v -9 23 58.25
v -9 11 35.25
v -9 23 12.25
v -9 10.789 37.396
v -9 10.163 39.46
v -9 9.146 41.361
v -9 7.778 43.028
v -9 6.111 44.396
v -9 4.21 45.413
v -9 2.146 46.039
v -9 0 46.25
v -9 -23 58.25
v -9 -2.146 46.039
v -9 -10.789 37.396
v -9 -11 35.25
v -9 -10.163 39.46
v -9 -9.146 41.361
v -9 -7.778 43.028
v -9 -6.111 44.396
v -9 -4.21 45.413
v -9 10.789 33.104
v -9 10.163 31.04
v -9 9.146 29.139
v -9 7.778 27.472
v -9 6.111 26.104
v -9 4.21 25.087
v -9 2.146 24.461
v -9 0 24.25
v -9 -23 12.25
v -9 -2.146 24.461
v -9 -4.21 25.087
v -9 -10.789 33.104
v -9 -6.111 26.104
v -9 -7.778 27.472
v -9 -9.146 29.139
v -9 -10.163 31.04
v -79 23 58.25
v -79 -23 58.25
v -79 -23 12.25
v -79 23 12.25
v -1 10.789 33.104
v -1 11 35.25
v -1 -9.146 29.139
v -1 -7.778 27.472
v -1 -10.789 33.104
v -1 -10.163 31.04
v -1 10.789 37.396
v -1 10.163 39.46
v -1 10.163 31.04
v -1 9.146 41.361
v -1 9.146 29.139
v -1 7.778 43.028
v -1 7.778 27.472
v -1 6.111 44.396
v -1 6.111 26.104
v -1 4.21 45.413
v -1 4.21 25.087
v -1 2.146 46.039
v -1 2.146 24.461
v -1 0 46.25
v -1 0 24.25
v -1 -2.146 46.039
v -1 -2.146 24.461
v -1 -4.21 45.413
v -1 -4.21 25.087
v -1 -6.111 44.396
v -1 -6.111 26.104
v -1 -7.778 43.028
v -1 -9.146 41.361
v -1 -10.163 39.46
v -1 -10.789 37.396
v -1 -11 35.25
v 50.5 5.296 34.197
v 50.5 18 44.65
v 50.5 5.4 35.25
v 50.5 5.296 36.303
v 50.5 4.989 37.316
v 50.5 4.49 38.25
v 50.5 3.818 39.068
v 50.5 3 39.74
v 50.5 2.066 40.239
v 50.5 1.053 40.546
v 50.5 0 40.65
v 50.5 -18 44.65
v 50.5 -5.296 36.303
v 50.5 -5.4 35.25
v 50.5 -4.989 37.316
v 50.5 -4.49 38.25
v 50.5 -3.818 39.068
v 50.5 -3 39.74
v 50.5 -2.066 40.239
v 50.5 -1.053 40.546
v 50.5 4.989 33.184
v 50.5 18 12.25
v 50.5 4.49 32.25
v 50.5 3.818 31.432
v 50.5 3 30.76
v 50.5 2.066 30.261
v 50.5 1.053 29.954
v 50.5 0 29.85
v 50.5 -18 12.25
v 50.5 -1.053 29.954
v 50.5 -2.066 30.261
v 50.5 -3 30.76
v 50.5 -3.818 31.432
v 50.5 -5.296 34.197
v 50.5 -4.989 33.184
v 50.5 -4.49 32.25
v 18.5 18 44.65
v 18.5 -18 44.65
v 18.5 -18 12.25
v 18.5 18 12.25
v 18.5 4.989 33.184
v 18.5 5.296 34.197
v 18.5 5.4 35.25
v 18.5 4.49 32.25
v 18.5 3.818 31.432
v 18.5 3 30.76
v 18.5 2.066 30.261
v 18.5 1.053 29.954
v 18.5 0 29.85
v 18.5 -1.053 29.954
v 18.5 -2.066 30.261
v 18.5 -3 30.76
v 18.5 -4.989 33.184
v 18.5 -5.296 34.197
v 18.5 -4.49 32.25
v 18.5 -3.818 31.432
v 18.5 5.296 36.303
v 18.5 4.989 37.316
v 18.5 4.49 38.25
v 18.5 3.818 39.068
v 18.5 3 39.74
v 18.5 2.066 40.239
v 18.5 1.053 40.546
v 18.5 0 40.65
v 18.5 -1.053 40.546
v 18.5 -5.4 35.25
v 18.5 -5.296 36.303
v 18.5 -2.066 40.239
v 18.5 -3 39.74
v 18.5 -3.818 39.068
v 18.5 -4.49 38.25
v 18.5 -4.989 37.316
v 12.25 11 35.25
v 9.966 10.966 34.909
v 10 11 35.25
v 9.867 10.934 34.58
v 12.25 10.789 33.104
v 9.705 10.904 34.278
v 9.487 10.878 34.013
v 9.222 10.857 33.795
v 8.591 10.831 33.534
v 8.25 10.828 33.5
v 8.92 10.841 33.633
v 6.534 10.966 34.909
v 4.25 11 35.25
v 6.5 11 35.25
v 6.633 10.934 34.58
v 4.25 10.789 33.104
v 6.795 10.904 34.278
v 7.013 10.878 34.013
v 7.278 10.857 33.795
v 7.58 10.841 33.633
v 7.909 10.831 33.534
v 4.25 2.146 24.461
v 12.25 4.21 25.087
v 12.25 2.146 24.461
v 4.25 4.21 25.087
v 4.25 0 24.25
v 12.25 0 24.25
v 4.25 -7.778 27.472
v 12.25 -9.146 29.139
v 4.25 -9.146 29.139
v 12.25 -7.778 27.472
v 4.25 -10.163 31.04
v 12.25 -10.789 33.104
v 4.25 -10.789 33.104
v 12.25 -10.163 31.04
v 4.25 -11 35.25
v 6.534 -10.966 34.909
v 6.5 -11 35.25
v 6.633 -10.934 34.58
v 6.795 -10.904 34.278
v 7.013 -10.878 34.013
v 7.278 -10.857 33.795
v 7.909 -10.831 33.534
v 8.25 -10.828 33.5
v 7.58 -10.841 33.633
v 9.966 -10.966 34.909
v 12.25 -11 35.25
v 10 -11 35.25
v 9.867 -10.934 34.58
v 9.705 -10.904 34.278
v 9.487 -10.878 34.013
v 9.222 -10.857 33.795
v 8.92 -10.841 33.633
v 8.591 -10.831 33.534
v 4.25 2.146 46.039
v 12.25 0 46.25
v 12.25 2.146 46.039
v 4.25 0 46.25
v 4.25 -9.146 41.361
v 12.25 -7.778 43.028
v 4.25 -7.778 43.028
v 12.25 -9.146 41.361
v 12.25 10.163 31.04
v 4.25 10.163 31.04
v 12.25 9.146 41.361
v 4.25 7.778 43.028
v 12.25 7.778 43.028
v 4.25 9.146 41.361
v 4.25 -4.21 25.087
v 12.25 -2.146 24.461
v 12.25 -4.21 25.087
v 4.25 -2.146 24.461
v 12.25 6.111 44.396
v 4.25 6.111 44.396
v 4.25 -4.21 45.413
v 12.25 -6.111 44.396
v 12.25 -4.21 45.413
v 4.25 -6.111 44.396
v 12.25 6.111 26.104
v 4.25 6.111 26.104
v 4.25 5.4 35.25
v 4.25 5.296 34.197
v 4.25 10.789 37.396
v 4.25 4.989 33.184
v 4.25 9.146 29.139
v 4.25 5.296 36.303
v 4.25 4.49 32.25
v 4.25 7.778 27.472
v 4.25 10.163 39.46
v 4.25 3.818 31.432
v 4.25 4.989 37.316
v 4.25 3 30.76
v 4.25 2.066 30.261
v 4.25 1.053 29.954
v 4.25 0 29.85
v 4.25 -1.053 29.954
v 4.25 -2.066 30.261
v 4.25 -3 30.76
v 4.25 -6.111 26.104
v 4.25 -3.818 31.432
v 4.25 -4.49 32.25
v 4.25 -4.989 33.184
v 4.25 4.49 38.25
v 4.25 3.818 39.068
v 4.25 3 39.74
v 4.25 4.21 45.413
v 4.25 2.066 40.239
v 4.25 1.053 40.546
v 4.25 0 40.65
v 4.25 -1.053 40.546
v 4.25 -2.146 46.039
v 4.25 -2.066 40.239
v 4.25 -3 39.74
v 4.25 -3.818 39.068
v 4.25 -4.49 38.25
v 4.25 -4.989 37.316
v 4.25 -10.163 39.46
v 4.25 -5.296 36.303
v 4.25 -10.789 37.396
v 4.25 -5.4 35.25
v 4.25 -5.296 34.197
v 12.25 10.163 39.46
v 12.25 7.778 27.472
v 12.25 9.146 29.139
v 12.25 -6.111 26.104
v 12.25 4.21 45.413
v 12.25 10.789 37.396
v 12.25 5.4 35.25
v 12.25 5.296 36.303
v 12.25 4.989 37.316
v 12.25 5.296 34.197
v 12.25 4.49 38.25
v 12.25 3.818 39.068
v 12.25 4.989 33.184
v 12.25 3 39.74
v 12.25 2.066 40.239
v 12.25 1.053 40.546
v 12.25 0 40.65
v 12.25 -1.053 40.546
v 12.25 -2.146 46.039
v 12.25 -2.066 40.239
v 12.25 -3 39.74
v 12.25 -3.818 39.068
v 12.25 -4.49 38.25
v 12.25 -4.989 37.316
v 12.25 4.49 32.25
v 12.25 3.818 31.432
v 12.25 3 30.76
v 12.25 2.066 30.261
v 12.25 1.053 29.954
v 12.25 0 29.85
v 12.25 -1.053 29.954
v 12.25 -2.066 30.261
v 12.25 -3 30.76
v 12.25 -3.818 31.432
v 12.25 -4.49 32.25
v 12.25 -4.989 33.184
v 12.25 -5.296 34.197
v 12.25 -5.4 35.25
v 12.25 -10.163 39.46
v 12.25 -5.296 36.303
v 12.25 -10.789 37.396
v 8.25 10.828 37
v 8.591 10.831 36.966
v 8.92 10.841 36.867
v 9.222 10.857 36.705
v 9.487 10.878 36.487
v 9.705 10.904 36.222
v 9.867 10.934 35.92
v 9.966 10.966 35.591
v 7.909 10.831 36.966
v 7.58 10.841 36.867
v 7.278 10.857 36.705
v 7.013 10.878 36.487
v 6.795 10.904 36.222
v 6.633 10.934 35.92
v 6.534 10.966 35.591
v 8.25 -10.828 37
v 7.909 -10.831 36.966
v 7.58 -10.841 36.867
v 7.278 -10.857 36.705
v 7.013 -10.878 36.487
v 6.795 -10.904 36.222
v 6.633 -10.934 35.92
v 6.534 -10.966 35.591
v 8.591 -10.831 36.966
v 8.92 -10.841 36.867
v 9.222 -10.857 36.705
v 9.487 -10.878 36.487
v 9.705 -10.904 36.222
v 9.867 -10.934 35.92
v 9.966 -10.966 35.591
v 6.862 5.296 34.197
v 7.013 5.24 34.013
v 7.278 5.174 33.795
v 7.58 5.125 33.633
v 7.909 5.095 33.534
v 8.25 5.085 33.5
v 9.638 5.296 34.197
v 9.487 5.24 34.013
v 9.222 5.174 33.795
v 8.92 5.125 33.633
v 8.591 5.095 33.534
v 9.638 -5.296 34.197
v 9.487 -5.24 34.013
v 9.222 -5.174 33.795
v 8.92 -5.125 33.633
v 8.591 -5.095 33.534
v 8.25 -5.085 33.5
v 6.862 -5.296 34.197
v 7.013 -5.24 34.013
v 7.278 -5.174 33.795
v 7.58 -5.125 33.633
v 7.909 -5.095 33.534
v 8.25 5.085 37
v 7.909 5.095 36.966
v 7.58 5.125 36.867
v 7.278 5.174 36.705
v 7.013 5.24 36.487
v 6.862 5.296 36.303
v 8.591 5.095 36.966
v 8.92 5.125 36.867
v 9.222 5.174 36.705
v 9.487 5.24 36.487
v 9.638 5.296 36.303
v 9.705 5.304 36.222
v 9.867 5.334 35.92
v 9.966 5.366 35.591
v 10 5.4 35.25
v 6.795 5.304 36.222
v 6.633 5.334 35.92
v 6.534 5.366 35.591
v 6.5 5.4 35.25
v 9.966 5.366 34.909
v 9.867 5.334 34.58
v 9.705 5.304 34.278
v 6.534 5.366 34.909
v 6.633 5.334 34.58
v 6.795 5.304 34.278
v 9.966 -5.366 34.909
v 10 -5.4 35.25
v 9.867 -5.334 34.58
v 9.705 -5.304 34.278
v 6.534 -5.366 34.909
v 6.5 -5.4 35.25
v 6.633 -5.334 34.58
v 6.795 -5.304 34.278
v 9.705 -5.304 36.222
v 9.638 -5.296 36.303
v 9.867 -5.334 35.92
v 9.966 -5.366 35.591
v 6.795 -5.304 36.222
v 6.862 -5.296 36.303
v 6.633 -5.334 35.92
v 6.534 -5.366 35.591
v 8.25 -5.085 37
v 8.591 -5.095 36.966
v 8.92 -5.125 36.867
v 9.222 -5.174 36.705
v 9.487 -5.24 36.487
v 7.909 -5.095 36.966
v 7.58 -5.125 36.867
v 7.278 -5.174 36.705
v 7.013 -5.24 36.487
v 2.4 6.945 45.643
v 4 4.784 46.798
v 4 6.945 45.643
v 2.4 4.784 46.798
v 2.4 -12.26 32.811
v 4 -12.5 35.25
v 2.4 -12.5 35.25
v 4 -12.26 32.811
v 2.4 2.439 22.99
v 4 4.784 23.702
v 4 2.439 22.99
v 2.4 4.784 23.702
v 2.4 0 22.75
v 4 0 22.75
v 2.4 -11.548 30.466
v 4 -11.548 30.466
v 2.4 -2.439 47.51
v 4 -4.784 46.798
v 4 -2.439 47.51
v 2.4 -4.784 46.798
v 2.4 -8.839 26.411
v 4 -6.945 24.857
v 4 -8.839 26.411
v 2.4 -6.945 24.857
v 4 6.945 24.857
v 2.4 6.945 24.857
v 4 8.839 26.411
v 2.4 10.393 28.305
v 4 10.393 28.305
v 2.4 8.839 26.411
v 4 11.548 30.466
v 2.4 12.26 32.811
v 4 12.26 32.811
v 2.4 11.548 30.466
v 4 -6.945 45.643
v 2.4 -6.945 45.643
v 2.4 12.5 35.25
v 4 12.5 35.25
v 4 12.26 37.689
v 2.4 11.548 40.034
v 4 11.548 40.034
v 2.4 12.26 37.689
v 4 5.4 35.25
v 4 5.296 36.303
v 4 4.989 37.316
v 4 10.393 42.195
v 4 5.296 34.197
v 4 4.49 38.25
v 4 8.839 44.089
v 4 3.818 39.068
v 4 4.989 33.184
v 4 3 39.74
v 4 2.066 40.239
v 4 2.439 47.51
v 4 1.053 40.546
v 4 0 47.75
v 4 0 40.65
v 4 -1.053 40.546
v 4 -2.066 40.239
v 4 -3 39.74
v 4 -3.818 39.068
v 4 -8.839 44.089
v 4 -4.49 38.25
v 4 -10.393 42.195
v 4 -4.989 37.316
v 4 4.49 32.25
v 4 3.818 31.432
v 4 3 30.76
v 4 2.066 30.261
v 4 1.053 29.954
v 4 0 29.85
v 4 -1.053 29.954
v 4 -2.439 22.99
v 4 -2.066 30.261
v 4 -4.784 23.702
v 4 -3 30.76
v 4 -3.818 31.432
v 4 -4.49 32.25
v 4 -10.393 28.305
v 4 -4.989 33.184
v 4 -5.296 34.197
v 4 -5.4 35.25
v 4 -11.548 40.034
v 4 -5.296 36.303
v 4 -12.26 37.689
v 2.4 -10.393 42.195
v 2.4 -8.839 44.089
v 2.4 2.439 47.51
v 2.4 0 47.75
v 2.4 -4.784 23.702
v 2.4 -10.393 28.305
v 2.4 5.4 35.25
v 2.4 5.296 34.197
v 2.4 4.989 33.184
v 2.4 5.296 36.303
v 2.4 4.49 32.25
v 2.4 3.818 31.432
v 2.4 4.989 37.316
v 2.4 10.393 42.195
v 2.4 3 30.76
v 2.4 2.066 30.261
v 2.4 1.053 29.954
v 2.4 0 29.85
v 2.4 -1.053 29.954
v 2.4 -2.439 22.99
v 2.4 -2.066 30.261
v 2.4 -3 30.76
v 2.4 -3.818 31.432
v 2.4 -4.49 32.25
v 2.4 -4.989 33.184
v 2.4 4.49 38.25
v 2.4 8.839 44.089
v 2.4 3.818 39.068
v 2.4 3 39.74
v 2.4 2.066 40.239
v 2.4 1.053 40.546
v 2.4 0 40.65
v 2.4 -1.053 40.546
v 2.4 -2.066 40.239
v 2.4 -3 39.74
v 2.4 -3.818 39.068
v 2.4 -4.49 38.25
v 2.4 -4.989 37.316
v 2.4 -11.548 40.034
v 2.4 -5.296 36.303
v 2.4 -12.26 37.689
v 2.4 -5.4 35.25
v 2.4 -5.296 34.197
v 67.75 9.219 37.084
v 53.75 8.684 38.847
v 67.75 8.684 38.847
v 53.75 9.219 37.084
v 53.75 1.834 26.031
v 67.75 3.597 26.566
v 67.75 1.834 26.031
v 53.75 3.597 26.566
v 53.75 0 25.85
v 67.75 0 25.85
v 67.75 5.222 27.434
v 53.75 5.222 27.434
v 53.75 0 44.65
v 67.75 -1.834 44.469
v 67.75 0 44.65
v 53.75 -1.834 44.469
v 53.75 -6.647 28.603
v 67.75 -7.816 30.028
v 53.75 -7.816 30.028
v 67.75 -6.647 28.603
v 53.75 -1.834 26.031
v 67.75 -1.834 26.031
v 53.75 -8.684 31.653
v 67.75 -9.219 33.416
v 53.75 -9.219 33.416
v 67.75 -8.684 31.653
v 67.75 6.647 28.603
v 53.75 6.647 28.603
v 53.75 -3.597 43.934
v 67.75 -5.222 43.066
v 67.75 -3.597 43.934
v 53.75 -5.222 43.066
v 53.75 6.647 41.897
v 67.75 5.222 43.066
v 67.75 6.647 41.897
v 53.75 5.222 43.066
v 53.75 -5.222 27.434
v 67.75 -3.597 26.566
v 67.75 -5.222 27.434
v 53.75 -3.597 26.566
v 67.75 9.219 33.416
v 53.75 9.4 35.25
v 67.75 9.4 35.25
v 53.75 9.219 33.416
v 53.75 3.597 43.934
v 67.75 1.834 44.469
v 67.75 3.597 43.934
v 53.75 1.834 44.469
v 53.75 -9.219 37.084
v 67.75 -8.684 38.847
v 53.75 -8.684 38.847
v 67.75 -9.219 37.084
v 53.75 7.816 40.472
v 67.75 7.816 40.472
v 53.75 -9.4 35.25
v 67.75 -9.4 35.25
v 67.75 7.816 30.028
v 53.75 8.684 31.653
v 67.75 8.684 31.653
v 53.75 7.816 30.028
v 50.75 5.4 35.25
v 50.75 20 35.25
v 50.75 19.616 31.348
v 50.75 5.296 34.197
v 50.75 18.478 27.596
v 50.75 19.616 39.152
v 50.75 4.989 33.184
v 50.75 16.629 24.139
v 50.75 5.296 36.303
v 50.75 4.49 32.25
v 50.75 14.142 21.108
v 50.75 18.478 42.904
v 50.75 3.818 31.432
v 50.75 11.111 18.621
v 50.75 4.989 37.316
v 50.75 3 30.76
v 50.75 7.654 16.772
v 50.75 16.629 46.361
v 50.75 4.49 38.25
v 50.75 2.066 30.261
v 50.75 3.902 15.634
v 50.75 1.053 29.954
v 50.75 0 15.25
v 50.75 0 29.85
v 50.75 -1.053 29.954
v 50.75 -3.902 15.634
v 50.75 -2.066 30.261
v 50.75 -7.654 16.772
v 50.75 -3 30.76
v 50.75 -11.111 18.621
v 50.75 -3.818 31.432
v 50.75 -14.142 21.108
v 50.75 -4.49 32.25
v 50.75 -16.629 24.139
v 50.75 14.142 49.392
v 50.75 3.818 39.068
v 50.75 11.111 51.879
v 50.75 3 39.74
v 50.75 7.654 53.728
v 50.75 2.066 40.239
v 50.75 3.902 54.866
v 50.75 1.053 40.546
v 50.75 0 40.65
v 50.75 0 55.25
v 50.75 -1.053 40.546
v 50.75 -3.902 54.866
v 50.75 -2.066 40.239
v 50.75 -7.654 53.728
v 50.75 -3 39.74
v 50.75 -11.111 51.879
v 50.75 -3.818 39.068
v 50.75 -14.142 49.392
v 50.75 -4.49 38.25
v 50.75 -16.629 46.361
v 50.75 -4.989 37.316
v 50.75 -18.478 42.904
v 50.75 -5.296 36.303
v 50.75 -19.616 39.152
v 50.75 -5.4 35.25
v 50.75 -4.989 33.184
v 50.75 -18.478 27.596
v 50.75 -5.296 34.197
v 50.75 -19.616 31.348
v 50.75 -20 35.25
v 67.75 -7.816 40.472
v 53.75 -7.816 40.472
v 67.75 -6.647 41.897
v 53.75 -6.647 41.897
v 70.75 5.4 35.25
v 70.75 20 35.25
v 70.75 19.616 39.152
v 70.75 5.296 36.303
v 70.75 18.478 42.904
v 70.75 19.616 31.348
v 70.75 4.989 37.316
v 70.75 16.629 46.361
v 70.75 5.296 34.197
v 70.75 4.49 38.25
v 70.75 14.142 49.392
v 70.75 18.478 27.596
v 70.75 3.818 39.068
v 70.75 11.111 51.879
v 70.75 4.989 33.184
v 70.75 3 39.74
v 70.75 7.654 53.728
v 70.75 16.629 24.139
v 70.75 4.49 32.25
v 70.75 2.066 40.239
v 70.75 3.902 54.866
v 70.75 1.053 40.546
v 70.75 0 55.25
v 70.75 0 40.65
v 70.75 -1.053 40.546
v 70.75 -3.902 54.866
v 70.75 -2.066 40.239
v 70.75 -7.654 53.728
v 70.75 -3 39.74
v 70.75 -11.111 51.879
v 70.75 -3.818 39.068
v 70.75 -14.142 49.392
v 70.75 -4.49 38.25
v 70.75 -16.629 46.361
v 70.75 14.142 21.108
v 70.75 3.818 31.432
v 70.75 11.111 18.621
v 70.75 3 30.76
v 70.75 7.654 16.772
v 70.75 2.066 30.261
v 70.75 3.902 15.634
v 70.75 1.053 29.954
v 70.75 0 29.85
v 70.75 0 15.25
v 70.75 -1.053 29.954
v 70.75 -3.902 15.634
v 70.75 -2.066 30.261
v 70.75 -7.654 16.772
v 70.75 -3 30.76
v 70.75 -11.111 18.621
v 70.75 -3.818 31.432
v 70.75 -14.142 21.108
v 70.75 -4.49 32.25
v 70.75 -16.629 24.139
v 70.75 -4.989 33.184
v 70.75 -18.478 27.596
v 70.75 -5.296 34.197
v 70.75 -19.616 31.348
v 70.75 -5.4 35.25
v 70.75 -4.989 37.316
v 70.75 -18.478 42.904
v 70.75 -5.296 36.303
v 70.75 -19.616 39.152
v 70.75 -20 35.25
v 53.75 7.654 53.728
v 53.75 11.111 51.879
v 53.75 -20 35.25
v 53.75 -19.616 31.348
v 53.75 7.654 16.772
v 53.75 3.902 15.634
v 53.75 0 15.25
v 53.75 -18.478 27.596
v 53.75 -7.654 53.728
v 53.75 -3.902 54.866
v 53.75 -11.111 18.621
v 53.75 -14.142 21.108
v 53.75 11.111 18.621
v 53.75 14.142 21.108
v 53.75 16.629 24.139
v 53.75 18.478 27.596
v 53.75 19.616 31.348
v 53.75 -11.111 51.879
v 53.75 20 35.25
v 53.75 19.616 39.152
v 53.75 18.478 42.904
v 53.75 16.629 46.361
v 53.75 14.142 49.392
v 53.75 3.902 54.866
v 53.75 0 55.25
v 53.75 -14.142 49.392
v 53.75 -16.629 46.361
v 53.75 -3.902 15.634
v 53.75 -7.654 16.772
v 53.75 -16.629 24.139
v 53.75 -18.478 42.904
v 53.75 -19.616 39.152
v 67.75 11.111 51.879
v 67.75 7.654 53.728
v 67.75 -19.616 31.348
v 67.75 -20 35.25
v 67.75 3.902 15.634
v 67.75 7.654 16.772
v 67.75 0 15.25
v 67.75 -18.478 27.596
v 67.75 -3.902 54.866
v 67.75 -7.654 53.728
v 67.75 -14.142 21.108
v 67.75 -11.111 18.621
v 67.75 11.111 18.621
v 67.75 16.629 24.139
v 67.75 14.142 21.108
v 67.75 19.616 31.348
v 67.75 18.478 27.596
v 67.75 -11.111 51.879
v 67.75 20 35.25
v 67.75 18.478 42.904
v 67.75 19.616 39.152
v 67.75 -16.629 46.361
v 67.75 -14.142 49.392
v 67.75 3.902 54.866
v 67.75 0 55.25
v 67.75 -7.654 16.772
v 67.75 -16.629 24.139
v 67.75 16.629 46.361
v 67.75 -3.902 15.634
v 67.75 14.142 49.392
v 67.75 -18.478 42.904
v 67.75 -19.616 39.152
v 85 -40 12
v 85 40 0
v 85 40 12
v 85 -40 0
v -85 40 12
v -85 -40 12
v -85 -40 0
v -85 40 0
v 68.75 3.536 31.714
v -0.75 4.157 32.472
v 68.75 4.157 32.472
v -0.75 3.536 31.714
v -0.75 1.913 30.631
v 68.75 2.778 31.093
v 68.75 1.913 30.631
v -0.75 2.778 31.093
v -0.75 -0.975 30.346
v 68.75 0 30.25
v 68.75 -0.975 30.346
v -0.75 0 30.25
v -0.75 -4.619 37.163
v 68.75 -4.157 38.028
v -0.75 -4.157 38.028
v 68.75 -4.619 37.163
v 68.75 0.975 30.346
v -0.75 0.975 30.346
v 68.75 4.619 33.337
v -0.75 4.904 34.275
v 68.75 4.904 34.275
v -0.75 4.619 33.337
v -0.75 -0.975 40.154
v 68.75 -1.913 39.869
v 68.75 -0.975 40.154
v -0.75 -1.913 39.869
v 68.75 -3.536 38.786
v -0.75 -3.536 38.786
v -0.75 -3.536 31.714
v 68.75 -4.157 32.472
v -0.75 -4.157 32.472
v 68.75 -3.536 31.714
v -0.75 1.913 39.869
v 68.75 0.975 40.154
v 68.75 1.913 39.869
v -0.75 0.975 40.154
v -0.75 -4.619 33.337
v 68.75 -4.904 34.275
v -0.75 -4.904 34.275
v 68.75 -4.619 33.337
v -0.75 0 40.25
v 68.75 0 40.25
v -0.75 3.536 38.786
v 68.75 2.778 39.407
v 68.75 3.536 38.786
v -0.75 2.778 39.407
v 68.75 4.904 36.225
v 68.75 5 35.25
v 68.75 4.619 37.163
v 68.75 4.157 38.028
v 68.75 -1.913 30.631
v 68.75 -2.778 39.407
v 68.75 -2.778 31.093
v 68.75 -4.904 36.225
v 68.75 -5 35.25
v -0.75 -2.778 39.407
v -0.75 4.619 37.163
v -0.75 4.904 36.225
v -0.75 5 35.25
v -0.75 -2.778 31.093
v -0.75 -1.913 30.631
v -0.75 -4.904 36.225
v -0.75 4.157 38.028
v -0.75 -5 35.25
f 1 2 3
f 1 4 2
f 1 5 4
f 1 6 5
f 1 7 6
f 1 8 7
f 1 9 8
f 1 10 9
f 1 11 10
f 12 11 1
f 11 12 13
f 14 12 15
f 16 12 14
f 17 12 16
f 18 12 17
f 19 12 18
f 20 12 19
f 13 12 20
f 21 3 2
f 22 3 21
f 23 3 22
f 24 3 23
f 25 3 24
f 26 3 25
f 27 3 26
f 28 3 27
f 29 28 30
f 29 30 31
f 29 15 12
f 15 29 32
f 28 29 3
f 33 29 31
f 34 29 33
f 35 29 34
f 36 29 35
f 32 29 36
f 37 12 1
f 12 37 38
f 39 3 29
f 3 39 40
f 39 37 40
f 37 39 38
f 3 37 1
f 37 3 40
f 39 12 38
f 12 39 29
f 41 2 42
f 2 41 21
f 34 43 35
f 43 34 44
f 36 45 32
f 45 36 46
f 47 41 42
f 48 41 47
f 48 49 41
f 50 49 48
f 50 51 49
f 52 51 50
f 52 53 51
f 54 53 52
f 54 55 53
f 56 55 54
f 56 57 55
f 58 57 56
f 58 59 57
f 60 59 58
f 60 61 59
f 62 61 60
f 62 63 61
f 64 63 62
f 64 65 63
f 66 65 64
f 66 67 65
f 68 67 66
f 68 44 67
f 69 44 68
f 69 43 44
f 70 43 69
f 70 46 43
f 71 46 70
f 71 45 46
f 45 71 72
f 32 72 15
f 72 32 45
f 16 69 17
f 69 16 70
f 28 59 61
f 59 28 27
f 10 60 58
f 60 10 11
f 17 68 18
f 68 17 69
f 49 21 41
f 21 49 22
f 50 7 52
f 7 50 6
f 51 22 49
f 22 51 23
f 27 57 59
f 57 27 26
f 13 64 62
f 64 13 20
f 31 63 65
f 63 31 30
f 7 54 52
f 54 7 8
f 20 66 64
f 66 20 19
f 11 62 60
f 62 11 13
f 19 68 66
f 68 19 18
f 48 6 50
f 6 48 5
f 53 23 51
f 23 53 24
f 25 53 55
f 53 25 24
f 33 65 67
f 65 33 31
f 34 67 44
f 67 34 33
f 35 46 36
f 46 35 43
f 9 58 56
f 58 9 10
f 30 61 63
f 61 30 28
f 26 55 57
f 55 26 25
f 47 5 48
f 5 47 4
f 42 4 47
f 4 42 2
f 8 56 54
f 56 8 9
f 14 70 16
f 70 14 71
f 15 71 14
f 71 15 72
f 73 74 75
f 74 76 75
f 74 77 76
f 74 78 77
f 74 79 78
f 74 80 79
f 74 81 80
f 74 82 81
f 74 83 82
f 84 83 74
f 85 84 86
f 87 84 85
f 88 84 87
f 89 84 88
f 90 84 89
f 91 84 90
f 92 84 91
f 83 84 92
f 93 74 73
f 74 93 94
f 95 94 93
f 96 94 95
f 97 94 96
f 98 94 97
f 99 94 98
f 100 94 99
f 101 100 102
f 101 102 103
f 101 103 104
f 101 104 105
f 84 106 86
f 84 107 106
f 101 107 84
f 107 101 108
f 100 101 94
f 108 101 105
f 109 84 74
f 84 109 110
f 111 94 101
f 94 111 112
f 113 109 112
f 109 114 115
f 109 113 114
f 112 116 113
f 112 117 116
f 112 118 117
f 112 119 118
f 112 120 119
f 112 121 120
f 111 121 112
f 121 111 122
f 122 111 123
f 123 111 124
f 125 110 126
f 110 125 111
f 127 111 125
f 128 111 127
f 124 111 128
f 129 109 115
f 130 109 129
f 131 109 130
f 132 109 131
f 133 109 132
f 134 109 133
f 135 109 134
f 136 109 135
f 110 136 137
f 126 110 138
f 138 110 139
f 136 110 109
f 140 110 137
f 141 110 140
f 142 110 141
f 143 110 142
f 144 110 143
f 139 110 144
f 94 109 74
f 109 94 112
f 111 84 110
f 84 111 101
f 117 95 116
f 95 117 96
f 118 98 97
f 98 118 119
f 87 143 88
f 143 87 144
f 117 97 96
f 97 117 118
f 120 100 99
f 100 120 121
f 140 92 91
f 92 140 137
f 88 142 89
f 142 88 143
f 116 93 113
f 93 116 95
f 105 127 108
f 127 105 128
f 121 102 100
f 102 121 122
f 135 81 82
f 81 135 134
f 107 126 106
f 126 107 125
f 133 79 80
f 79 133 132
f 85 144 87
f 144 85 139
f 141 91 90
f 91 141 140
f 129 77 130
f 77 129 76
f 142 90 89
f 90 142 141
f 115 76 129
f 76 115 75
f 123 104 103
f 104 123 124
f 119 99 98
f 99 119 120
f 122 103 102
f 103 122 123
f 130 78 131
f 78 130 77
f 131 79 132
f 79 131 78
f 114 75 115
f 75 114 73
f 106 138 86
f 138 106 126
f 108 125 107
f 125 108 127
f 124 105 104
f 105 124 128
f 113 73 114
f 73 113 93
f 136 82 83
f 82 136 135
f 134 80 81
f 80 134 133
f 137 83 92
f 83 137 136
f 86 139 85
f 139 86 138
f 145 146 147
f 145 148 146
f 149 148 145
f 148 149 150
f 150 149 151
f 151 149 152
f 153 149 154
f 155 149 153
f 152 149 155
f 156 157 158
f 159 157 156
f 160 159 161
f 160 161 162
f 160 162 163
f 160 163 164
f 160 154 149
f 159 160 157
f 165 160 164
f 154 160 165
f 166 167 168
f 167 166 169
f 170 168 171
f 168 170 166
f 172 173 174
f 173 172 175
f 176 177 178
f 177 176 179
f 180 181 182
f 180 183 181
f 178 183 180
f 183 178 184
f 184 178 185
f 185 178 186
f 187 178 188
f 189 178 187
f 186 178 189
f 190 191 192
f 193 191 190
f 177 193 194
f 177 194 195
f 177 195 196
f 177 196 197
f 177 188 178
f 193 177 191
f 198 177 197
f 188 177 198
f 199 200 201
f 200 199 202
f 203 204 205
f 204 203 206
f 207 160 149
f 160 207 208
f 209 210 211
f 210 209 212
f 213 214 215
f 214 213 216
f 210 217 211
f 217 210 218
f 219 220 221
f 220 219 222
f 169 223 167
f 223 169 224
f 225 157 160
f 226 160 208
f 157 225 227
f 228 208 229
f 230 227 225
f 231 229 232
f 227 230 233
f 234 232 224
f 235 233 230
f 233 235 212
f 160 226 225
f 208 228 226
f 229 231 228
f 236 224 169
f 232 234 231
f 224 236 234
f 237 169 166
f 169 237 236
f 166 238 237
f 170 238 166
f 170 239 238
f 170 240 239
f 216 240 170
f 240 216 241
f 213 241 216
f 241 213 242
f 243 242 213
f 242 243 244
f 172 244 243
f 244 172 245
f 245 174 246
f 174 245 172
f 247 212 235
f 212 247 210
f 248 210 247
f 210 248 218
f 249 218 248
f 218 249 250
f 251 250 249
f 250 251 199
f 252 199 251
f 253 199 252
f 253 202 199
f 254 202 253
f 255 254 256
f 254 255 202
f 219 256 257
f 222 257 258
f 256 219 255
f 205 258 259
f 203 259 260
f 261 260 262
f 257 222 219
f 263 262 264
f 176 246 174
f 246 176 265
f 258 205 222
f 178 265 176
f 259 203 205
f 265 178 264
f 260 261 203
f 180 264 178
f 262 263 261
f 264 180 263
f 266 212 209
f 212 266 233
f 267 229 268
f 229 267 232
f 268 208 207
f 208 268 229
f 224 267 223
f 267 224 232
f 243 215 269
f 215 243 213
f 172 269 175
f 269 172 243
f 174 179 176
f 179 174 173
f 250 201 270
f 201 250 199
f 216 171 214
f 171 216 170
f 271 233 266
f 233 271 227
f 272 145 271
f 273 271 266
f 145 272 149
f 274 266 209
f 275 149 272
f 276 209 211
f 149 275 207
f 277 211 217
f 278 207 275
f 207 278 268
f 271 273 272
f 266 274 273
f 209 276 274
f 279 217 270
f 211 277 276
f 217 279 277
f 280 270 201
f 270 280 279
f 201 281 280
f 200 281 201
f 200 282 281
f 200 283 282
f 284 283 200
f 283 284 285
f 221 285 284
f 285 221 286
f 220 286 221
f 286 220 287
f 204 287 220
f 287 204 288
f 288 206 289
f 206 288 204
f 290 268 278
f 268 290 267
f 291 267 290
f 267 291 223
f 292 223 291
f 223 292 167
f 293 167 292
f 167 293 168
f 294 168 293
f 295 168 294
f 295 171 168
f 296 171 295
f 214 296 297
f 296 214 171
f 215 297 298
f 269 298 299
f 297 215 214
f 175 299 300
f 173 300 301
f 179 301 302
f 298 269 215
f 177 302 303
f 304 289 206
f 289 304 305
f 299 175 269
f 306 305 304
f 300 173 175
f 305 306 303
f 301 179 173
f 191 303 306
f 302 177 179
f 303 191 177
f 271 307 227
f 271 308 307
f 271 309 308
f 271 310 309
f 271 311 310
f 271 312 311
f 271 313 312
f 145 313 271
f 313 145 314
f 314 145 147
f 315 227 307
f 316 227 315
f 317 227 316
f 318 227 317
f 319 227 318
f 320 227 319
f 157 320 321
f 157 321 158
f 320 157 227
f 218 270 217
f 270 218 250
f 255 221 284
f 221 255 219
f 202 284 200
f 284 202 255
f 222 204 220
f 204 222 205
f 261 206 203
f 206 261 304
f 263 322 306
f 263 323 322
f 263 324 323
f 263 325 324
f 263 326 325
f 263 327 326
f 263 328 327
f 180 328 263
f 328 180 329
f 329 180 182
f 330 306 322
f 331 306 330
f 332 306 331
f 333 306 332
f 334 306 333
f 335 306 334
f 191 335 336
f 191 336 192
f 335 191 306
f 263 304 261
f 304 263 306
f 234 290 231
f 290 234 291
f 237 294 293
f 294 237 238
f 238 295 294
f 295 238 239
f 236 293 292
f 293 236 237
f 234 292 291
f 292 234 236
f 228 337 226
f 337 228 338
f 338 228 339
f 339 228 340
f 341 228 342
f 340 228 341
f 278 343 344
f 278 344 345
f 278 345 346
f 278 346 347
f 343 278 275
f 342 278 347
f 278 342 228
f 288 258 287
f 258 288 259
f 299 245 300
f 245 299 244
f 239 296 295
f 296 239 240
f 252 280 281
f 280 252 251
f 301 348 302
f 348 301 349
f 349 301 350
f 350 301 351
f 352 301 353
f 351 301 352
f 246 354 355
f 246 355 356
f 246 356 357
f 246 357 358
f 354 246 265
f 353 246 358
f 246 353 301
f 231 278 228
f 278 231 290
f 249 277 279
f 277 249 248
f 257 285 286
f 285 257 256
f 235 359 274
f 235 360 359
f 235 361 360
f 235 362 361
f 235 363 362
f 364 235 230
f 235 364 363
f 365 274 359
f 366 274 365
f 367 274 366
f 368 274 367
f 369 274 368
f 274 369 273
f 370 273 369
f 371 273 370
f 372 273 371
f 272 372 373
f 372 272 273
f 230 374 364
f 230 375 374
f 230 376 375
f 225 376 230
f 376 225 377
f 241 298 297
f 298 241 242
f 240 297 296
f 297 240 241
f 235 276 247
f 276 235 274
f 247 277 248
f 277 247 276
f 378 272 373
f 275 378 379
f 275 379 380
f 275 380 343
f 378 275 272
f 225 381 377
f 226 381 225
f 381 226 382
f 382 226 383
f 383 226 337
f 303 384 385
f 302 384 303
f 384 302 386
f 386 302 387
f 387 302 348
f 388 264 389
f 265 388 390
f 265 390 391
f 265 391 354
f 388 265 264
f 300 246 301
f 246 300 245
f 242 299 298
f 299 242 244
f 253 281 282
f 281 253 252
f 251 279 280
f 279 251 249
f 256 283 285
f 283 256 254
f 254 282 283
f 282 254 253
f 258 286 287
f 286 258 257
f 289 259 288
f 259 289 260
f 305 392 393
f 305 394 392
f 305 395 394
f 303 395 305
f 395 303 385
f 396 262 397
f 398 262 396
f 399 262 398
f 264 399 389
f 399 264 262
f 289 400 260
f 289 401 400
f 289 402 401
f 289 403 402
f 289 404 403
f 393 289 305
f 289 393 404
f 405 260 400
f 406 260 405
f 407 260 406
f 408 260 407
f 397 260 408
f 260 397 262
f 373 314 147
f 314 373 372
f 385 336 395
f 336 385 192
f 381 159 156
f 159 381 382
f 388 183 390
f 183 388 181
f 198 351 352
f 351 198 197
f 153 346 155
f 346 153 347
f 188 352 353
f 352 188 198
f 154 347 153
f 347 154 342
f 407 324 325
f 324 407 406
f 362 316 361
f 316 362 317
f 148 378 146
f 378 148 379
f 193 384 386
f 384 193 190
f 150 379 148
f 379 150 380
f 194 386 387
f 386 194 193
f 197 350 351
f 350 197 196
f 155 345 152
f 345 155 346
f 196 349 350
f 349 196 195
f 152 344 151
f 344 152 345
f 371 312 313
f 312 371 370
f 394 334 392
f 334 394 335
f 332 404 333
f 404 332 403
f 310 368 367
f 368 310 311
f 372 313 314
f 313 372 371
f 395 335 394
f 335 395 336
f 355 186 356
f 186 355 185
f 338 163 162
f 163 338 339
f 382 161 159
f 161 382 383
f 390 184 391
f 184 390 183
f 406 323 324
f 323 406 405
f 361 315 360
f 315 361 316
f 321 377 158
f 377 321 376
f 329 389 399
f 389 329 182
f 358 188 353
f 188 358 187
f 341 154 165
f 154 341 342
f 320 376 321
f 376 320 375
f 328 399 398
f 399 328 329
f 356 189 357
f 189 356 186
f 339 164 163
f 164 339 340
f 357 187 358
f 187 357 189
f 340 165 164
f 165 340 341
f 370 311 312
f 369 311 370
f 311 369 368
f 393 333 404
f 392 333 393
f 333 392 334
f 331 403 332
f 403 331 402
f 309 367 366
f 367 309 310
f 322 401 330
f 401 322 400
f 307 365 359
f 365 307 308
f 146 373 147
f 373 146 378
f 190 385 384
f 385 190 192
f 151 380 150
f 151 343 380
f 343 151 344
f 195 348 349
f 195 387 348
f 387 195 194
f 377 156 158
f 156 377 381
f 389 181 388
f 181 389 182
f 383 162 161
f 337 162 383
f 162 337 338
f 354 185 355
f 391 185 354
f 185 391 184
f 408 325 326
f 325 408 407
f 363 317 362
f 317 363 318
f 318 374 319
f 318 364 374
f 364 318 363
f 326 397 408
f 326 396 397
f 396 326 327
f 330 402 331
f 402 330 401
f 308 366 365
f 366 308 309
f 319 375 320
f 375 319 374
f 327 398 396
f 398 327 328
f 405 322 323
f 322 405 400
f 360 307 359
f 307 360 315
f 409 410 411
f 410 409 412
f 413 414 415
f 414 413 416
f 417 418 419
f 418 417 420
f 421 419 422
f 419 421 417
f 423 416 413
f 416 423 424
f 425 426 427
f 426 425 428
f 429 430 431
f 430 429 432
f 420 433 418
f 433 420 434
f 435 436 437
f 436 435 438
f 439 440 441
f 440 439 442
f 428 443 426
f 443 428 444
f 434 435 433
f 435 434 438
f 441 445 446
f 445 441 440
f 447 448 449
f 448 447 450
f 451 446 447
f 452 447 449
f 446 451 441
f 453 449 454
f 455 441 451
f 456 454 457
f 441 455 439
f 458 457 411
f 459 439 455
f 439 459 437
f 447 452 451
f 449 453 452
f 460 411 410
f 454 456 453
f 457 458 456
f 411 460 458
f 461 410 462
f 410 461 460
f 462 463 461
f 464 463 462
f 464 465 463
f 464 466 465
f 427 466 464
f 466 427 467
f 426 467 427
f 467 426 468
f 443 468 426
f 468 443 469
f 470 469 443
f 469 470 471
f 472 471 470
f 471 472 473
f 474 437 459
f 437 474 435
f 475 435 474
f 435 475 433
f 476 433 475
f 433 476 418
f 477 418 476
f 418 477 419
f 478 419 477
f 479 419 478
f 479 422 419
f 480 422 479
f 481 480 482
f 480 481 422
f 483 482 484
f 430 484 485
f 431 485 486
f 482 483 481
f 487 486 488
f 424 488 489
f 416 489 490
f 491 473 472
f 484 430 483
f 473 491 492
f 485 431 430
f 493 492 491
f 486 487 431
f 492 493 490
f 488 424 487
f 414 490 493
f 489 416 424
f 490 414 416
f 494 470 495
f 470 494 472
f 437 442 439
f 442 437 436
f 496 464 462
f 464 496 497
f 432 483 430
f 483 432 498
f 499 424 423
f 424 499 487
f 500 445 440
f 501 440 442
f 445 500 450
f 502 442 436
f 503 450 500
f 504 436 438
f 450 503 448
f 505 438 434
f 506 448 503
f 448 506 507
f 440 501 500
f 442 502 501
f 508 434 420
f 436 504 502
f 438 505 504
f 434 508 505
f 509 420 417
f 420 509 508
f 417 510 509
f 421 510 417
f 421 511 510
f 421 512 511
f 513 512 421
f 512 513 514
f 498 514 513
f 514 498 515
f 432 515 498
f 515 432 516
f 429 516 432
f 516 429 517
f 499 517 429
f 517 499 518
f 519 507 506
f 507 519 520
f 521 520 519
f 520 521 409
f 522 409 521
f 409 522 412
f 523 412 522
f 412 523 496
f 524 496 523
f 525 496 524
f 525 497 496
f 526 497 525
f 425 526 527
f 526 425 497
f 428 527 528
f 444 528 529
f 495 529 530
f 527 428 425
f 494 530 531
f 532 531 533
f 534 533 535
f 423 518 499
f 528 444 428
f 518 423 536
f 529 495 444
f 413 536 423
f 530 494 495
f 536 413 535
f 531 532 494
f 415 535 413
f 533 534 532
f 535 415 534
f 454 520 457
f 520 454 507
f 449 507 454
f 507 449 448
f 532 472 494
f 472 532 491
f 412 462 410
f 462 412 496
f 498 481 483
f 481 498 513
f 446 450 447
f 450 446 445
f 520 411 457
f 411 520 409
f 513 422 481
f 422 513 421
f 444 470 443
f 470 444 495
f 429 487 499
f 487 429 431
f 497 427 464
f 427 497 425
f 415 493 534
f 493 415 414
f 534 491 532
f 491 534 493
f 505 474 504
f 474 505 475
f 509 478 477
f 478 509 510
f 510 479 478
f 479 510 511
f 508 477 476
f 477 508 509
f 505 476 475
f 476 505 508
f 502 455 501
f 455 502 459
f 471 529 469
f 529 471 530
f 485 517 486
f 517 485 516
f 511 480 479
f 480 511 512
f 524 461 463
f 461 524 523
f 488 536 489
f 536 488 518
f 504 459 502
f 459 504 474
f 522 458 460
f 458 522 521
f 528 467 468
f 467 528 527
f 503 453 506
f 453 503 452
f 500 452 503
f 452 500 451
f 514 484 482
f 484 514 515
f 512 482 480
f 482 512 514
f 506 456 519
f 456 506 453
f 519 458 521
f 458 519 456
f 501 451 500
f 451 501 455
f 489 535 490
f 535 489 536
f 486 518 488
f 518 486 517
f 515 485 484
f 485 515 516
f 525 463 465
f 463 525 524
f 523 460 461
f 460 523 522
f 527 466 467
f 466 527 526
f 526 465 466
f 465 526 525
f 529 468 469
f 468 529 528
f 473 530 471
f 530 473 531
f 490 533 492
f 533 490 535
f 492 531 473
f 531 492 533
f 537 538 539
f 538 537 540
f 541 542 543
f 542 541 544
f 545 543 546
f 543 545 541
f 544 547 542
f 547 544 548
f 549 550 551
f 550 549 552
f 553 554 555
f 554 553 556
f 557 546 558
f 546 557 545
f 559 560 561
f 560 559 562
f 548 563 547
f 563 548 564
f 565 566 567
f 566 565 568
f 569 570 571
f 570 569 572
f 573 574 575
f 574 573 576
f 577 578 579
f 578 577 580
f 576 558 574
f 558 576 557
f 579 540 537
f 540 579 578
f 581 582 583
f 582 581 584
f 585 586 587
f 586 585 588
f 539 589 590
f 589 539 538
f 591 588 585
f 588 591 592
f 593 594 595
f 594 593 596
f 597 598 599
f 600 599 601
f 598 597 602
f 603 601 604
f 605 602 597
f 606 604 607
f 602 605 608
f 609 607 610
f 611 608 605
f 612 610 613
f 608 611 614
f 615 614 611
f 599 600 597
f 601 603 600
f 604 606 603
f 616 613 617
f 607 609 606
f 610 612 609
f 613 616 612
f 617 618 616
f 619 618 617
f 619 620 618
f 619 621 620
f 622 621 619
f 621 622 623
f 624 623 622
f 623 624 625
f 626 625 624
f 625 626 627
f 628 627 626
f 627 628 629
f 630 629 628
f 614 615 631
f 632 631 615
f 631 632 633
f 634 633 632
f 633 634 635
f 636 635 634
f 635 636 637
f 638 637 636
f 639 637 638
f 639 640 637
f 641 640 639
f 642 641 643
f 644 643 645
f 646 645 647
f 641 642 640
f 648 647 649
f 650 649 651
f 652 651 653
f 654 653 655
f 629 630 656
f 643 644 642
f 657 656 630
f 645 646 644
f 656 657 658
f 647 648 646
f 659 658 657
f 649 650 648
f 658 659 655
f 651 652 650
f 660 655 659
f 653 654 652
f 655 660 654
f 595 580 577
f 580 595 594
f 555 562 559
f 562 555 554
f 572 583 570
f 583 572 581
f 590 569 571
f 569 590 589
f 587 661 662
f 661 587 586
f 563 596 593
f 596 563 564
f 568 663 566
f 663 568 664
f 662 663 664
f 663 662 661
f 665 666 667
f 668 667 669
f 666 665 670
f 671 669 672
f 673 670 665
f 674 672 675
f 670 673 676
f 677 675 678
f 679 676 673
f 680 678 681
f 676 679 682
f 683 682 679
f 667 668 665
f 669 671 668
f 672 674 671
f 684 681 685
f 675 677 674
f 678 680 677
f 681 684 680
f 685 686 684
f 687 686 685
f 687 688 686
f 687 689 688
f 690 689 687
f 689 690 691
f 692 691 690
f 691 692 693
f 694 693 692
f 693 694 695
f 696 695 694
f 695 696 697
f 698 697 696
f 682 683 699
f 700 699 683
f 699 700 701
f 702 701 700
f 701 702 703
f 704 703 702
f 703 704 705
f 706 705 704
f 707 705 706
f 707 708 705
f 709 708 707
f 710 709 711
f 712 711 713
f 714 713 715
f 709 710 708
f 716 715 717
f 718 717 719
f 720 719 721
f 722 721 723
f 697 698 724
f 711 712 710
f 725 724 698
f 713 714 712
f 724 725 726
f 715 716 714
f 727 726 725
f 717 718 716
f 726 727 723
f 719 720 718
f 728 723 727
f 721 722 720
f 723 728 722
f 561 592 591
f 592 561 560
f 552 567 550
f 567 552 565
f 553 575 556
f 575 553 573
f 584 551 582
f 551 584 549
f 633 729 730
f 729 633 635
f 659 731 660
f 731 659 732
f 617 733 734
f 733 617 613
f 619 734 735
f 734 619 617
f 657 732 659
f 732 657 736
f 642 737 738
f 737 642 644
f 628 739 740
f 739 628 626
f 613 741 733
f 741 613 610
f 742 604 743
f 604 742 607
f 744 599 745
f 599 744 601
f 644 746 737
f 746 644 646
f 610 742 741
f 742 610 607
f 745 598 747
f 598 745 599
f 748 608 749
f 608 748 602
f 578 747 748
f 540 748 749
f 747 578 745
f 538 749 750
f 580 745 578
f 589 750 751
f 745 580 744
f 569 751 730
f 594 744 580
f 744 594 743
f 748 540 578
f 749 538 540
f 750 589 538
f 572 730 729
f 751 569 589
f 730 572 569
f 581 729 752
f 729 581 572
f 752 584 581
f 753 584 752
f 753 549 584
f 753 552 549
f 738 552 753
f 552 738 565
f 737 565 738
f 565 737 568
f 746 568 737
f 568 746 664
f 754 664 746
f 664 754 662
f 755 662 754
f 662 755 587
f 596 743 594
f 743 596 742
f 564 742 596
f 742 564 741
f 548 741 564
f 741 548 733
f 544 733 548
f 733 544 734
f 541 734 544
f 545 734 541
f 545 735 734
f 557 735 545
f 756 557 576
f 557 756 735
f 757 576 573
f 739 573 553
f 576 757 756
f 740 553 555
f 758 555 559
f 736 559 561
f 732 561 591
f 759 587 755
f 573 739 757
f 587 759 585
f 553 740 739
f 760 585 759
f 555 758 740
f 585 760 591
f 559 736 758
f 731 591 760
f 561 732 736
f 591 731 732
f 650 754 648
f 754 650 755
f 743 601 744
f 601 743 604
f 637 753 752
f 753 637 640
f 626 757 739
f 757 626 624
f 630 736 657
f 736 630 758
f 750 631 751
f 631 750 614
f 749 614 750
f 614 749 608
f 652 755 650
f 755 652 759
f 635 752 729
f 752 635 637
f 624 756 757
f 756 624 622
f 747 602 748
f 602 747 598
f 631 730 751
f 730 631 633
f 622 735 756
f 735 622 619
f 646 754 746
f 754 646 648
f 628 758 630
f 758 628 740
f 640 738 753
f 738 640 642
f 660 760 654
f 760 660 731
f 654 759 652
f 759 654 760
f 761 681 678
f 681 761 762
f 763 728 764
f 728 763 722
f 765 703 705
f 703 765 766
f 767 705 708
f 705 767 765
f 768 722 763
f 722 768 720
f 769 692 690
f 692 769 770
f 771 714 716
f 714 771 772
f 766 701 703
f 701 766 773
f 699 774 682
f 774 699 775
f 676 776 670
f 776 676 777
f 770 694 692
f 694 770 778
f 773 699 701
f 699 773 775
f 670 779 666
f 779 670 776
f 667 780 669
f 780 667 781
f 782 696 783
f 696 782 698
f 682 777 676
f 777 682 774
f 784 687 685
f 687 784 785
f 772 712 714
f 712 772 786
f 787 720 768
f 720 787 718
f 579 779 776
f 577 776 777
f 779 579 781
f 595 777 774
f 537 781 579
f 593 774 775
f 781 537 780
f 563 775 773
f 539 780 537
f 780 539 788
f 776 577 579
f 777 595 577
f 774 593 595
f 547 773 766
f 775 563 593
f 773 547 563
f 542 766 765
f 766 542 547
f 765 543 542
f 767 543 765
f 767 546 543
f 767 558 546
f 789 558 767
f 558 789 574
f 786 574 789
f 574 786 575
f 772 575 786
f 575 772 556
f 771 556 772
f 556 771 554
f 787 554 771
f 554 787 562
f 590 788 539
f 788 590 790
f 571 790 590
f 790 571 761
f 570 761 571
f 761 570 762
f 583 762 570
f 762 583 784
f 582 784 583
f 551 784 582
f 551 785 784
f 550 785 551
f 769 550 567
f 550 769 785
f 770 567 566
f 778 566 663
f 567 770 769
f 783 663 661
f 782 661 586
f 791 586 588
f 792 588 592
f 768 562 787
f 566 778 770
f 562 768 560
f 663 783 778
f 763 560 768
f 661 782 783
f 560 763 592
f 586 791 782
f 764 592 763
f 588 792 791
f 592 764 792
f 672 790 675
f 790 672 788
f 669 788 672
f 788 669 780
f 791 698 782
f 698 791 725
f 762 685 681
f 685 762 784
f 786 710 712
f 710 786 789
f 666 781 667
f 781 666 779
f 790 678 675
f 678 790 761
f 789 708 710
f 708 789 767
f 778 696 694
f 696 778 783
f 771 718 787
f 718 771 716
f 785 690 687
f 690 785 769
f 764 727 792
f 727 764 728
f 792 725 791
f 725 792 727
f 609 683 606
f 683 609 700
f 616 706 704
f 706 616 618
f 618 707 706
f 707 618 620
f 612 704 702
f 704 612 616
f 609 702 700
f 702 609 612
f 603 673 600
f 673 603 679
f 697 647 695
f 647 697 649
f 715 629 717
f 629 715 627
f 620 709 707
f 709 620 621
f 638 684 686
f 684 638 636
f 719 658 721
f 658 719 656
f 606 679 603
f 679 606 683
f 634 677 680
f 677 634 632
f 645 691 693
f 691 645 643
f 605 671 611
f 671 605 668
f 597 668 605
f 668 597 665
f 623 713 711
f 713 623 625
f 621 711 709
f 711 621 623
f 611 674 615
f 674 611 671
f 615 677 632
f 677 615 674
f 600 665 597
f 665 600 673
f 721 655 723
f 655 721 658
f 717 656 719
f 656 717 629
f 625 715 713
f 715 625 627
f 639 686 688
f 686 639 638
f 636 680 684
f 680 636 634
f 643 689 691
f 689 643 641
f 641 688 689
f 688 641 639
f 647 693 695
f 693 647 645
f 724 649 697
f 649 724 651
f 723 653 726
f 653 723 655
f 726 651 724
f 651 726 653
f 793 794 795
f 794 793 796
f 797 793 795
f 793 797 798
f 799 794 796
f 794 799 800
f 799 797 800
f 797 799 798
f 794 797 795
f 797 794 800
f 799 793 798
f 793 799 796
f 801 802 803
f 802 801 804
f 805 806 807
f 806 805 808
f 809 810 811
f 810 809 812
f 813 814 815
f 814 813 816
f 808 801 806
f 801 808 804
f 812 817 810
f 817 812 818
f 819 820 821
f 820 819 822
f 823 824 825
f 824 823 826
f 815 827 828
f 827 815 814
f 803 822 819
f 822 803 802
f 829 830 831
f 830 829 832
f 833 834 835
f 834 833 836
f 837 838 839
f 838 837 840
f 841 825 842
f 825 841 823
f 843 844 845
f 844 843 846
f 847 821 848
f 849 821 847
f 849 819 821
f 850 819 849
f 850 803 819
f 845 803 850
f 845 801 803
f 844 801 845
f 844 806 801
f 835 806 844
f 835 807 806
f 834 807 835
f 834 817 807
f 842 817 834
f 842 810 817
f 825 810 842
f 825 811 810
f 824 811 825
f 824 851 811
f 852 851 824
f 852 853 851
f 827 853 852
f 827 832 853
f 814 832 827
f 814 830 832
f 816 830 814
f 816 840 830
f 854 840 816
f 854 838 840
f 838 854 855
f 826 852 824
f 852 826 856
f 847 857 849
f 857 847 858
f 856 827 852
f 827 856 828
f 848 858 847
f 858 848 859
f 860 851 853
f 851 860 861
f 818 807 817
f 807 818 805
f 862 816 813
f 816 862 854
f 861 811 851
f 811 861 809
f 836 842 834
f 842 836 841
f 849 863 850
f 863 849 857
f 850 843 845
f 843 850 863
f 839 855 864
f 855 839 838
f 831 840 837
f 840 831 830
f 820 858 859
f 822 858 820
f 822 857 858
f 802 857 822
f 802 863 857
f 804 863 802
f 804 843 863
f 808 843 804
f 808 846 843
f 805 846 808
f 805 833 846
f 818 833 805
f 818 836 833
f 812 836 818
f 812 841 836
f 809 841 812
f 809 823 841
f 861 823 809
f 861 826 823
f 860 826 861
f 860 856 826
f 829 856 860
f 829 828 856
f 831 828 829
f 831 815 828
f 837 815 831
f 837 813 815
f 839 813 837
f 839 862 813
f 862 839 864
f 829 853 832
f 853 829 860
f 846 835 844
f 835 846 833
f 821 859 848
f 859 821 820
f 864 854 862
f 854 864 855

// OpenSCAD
$fn = 32;

// ------------------------------------------------------------------------
// Motor drive station: motor 70 x 46 mm, shaft d10, pulley d40
// Every part is its own module, assembly() places every instance.
// ------------------------------------------------------------------------

// --- part 1 ---
module station_bed() {
  difference() {
    translate([-85, -40, 0]) cube([170, 80, 12]);
  }
}

// --- part 2 ---
module drive_motor() {
  union() {
    translate([-35, -23, 0]) cube([70, 46, 46]);
    translate([39, 0, 23]) rotate([0, 90, 0]) cylinder(h = 8, d = 22, center = true);
  }
}

// --- part 3 ---
module pillow_block() {
  difference() {
    translate([-16, -18, 0]) cube([32, 36, 32.4]);
    translate([0, 0, 23]) rotate([0, 90, 0]) cylinder(h = 34, d = 10.8, center = true);
  }
}

// --- part 4 ---
module drive_shaft() {
  translate([0, 0, -34.75]) cylinder(h = 69.5, d = 10);
}

// --- part 5 ---
module shaft_collar() {
  difference() {
    cylinder(h = 8, d = 22);
    translate([0, 0, -1]) cylinder(h = 10, d = 10.8);
    translate([0, 0, 4]) rotate([90, 0, 0]) cylinder(h = 24, d = 3.5, center = true);
  }
}

// --- part 6 ---
module collar_washer() {
  difference() {
      translate([0, 0, 0]) cylinder(h = 1.6, d = 25);
      translate([0, 0, -1]) cylinder(h = 3.6, d = 10.8);
    }
}

// --- part 7 ---
module drive_pulley() {
  difference() {
    union() {
      cylinder(h = 20, d = 18.8);
      cylinder(h = 3, d = 40);
      translate([0, 0, 17]) cylinder(h = 3, d = 40);
    }
    translate([0, 0, -1]) cylinder(h = 22, d = 10.8);
  }
}

// --- assembly ---
module assembly() {
  color([0.80, 0.24, 0.20]) translate([0, 0, 0]) rotate([0, 0, 0]) station_bed();
  color([0.20, 0.45, 0.75]) translate([-44, 0, 12.25]) rotate([0, 0, 0]) drive_motor();
  color([0.25, 0.62, 0.32]) translate([34.5, 0, 12.25]) rotate([0, 0, 0]) pillow_block();
  color([0.92, 0.70, 0.18]) translate([34, 0, 35.25]) rotate([0, 90, 0]) drive_shaft();
  color([0.58, 0.35, 0.70]) translate([4.25, 0, 35.25]) rotate([0, 90, 0]) shaft_collar();
  color([0.16, 0.66, 0.66]) translate([2.4, 0, 35.25]) rotate([0, 90, 0]) collar_washer();
  color([0.85, 0.48, 0.18]) translate([50.75, 0, 35.25]) rotate([0, 90, 0]) drive_pulley();
}

assembly();
